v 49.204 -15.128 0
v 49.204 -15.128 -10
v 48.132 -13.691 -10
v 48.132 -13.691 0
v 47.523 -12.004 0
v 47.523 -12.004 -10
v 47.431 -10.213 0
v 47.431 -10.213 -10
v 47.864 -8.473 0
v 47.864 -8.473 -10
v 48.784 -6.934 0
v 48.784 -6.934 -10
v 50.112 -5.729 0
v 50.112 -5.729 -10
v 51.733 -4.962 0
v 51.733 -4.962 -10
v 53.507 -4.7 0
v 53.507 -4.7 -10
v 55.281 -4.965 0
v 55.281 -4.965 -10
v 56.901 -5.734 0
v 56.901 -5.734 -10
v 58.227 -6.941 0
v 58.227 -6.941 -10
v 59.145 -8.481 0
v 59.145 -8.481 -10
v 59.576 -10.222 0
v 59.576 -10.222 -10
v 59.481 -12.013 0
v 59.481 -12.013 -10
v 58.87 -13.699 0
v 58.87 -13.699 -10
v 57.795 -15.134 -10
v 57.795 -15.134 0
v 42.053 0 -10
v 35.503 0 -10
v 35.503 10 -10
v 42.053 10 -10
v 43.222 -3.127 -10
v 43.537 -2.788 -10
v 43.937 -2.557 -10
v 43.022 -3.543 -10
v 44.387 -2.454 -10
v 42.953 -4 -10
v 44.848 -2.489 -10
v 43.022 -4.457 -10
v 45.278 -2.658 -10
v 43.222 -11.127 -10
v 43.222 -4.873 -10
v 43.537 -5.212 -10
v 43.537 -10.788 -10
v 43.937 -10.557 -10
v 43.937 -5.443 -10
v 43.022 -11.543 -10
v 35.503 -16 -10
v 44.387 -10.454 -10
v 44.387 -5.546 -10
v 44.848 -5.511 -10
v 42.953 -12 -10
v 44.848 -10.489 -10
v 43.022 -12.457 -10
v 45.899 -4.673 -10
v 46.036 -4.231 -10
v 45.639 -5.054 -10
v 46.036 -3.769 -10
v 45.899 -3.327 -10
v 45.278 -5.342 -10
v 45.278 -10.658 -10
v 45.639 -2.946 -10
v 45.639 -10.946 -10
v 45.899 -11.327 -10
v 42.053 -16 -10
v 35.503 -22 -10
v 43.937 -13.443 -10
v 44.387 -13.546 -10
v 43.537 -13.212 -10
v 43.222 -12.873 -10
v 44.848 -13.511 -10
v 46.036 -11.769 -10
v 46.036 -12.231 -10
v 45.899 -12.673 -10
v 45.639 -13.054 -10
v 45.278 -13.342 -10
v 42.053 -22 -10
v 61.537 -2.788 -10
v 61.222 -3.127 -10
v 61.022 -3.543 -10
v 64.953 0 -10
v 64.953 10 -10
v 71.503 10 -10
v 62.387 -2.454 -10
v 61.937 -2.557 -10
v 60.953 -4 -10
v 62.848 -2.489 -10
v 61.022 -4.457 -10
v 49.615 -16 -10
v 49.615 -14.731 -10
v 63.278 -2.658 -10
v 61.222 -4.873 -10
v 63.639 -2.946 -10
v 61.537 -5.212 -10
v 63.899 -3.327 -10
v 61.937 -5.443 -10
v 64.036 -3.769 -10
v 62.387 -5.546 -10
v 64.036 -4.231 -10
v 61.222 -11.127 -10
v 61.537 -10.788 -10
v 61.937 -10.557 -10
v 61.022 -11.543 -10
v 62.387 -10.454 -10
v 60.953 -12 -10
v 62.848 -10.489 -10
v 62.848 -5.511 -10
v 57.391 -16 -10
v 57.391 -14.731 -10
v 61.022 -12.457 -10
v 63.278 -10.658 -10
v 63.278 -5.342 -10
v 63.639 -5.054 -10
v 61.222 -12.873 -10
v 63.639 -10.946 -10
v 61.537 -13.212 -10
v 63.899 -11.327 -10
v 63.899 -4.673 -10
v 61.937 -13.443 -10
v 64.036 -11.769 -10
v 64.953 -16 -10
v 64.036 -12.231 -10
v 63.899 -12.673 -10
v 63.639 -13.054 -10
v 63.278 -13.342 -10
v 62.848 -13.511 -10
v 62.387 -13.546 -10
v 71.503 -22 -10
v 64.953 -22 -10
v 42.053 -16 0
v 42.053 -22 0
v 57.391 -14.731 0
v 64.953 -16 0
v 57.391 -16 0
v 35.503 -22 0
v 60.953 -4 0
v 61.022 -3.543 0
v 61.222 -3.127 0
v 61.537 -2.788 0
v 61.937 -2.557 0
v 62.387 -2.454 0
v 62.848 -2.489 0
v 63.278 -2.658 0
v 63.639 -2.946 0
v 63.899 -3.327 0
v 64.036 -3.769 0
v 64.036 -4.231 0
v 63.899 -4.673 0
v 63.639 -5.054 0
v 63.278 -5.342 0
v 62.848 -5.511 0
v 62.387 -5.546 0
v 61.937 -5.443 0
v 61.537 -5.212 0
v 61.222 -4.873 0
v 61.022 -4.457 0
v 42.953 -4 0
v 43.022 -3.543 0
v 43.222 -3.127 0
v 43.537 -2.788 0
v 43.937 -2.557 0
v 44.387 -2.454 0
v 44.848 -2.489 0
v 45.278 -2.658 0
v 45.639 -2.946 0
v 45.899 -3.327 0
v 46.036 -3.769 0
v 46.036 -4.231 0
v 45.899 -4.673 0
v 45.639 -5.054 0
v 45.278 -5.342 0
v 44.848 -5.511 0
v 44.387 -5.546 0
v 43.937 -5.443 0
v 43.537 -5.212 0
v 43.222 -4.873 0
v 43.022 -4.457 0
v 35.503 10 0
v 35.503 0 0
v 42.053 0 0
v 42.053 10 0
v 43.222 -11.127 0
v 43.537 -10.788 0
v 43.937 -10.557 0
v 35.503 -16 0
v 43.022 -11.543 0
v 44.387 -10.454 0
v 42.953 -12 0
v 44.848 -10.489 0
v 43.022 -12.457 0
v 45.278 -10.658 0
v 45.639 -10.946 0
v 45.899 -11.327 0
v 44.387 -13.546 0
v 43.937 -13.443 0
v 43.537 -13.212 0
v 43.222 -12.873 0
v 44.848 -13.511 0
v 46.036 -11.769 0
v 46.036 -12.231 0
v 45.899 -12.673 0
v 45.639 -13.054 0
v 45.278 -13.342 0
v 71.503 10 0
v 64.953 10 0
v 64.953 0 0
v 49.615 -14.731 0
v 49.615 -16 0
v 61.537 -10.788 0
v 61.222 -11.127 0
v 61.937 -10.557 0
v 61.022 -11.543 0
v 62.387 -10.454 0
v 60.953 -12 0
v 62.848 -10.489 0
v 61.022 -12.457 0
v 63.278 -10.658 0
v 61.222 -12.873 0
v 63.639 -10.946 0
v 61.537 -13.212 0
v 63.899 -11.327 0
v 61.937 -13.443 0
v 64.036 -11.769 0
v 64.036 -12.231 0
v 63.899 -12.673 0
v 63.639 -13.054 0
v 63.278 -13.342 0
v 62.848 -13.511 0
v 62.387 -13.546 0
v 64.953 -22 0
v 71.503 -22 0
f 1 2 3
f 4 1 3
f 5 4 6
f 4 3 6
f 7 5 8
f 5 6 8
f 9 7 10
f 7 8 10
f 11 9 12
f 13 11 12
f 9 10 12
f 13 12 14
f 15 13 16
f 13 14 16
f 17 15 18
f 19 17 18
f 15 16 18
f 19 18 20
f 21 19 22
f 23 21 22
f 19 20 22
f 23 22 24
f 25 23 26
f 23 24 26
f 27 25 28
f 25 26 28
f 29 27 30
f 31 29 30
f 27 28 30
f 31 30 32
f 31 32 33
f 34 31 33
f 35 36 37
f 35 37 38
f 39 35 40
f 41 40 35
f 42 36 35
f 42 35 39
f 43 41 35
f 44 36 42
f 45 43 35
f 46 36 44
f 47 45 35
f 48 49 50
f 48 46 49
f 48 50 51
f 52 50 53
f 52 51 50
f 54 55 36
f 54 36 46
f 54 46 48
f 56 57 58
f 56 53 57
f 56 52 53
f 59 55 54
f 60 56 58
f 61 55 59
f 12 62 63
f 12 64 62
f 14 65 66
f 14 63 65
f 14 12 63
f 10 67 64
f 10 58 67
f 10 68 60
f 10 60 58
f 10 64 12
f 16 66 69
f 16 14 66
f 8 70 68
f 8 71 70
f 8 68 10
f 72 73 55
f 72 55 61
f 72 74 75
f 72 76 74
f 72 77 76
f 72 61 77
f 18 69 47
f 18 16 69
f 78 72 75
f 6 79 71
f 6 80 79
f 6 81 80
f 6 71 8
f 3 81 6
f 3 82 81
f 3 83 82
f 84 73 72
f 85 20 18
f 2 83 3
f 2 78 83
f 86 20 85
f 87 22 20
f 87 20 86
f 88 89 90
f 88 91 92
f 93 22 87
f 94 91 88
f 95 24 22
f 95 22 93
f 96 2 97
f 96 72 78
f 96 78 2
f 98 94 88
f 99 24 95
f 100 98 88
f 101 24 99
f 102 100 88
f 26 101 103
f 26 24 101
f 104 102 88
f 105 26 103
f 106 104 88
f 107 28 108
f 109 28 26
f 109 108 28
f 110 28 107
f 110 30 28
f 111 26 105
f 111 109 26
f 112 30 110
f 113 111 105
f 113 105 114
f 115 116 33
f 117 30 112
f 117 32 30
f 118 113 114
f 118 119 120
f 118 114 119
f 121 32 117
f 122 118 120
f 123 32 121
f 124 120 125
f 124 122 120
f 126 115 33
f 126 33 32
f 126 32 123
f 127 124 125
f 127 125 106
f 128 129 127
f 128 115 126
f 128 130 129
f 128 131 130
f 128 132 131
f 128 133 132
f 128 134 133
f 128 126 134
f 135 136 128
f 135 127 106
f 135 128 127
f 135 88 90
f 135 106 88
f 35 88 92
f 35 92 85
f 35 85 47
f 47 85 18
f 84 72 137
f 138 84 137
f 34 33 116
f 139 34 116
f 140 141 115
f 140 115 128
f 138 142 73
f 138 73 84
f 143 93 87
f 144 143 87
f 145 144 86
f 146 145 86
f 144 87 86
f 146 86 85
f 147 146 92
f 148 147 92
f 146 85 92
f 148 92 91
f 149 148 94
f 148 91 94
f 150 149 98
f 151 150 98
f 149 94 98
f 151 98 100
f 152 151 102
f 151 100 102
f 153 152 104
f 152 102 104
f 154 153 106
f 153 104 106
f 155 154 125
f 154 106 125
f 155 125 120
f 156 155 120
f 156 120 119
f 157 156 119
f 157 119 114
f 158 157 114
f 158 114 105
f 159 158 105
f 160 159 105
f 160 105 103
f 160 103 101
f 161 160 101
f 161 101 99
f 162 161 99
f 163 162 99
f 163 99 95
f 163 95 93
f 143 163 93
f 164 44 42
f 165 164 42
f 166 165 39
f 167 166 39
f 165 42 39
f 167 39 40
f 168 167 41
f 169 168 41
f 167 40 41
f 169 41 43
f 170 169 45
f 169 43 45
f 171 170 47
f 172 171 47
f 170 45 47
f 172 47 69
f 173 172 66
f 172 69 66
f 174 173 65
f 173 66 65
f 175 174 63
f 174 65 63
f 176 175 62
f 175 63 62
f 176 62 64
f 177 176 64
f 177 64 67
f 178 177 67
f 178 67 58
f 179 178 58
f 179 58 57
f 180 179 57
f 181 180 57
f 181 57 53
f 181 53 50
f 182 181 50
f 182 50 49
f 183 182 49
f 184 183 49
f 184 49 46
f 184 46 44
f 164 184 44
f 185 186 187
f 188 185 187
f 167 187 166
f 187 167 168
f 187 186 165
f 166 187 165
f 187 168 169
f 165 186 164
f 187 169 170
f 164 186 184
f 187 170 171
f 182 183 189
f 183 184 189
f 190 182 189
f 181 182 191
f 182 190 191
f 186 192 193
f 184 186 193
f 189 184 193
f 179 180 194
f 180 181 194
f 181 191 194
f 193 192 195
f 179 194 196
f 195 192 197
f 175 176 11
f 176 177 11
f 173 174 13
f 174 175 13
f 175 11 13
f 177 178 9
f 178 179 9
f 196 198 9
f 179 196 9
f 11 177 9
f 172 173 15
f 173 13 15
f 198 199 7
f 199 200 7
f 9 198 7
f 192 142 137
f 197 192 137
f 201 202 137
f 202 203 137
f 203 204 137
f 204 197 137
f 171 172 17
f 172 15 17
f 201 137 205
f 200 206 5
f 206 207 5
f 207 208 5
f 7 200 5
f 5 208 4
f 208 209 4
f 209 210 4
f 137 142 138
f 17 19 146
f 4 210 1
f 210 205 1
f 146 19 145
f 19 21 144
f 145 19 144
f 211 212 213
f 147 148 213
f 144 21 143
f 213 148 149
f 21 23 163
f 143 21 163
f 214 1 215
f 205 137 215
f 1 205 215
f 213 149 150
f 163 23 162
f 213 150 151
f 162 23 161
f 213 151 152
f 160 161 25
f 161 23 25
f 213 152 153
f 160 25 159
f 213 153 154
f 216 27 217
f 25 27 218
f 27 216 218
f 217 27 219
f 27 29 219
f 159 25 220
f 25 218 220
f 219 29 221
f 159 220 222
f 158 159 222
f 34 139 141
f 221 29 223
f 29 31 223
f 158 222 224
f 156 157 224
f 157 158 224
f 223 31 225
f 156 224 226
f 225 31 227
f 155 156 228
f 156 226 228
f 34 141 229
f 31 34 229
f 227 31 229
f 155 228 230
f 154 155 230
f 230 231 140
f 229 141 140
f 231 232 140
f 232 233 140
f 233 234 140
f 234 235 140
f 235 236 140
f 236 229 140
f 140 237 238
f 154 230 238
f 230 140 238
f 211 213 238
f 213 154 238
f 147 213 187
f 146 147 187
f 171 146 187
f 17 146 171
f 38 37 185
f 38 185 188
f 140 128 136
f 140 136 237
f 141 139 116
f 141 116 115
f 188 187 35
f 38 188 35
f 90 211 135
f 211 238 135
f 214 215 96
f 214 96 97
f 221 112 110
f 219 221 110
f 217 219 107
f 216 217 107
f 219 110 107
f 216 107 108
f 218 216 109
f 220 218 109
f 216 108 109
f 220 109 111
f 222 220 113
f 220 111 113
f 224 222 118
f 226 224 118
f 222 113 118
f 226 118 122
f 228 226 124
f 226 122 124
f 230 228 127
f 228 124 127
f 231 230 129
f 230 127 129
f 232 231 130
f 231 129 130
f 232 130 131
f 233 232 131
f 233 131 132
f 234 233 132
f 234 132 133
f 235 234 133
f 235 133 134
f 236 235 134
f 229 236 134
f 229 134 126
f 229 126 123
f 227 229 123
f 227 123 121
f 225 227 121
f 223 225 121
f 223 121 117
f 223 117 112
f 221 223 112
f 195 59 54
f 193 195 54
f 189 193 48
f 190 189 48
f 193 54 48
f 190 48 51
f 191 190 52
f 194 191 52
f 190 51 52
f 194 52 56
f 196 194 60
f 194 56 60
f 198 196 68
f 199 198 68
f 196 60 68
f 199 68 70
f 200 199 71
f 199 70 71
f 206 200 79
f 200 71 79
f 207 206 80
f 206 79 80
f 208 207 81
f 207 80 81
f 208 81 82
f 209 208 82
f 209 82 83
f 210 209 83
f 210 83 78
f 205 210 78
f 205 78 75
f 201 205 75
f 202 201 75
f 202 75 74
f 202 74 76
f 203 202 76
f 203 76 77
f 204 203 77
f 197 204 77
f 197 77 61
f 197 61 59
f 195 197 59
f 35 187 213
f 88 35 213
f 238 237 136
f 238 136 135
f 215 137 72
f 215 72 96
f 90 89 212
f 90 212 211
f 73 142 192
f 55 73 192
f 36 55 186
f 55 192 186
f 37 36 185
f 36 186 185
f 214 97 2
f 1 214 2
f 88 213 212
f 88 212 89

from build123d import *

# Parameters (mm, degrees)
SZKIC1_W                    = 36
SZKIC1_H                    = 16
DODANIE_WYCI_GNI_CIE1_DEPTH = 10
WYTNIJ_WYCI_GNI_CIE1_DEPTH  = 10
SZKIC3_R                    = 1.55
WYTNIJ_WYCI_GNI_CIE2_DEPTH  = 74.950499929
SZKIC4_W                    = 6.55
SZKIC4_H                    = 10
DODANIE_WYCI_GNI_CIE2_DEPTH = 6
SZKIC5_W                    = 6.55
SZKIC5_H                    = 10
DODANIE_WYCI_GNI_CIE3_DEPTH = 10


with BuildPart() as part:
    # Szkic1 → Dodanie-wyciągnięcie1 (new body)
    with BuildSketch(Plane.XY):
        with Locations((53.502982034, -8)):
            Rectangle(SZKIC1_W, SZKIC1_H)
    extrude(amount=-DODANIE_WYCI_GNI_CIE1_DEPTH)

    # Szkic2 → Wytnij-wyciągnięcie1 (cut)
    with BuildSketch(Plane(origin=(0, 0, -10), x_dir=(-1, 0, 0), z_dir=(0, 0, -1))):
        with BuildLine():
            Line((-57.391426453, -16), (-49.614537615, -16))
            Line((-49.614537615, -16), (-49.614537615, -14.730541148))
            Line((-49.614537615, -14.730541148), (-49.204397396, -15.128067711))
            ThreePointArc((-49.204397396, -15.128067711), (-53.507441674, -4.70000163), (-57.795233679, -15.134348373))
            Line((-57.795233679, -15.134348373), (-57.391426453, -14.730541148))
            Line((-57.391426453, -14.730541148), (-57.391426453, -16))
        make_face()
    extrude(amount=-WYTNIJ_WYCI_GNI_CIE1_DEPTH, mode=Mode.SUBTRACT)

    # Szkic3 → Wytnij-wyciągnięcie2 (cut, through all)
    with BuildSketch(Plane(origin=(0, 0, -10), x_dir=(-1, 0, 0), z_dir=(0, 0, -1))):
        with Locations((-44.502982034, -12)):
            Circle(SZKIC3_R)
        with Locations((-44.502982034, -4)):
            Circle(SZKIC3_R)
        with Locations((-62.502982034, -12)):
            Circle(SZKIC3_R)
        with Locations((-62.502982034, -4)):
            Circle(SZKIC3_R)
    extrude(amount=-WYTNIJ_WYCI_GNI_CIE2_DEPTH, mode=Mode.SUBTRACT)

    # Szkic4 → Dodanie-wyciągnięcie2 (add)
    with BuildSketch(Plane.XZ.offset(16)):
        with Locations((68.227982034, -5)):
            Rectangle(SZKIC4_W, SZKIC4_H)
        with Locations((38.777982035, -5)):
            Rectangle(SZKIC4_W, SZKIC4_H)
    extrude(amount=DODANIE_WYCI_GNI_CIE2_DEPTH)

    # Szkic5 → Dodanie-wyciągnięcie3 (add)
    with BuildSketch(Plane(origin=(0, 0, 0), x_dir=(1, 0, 0), z_dir=(0, 1, 0))):
        with Locations((68.227982034, 5)):
            Rectangle(SZKIC5_W, SZKIC5_H)
        with Locations((38.777982035, 5)):
            Rectangle(SZKIC5_W, SZKIC5_H)
    extrude(amount=DODANIE_WYCI_GNI_CIE3_DEPTH)


solid = part.part
